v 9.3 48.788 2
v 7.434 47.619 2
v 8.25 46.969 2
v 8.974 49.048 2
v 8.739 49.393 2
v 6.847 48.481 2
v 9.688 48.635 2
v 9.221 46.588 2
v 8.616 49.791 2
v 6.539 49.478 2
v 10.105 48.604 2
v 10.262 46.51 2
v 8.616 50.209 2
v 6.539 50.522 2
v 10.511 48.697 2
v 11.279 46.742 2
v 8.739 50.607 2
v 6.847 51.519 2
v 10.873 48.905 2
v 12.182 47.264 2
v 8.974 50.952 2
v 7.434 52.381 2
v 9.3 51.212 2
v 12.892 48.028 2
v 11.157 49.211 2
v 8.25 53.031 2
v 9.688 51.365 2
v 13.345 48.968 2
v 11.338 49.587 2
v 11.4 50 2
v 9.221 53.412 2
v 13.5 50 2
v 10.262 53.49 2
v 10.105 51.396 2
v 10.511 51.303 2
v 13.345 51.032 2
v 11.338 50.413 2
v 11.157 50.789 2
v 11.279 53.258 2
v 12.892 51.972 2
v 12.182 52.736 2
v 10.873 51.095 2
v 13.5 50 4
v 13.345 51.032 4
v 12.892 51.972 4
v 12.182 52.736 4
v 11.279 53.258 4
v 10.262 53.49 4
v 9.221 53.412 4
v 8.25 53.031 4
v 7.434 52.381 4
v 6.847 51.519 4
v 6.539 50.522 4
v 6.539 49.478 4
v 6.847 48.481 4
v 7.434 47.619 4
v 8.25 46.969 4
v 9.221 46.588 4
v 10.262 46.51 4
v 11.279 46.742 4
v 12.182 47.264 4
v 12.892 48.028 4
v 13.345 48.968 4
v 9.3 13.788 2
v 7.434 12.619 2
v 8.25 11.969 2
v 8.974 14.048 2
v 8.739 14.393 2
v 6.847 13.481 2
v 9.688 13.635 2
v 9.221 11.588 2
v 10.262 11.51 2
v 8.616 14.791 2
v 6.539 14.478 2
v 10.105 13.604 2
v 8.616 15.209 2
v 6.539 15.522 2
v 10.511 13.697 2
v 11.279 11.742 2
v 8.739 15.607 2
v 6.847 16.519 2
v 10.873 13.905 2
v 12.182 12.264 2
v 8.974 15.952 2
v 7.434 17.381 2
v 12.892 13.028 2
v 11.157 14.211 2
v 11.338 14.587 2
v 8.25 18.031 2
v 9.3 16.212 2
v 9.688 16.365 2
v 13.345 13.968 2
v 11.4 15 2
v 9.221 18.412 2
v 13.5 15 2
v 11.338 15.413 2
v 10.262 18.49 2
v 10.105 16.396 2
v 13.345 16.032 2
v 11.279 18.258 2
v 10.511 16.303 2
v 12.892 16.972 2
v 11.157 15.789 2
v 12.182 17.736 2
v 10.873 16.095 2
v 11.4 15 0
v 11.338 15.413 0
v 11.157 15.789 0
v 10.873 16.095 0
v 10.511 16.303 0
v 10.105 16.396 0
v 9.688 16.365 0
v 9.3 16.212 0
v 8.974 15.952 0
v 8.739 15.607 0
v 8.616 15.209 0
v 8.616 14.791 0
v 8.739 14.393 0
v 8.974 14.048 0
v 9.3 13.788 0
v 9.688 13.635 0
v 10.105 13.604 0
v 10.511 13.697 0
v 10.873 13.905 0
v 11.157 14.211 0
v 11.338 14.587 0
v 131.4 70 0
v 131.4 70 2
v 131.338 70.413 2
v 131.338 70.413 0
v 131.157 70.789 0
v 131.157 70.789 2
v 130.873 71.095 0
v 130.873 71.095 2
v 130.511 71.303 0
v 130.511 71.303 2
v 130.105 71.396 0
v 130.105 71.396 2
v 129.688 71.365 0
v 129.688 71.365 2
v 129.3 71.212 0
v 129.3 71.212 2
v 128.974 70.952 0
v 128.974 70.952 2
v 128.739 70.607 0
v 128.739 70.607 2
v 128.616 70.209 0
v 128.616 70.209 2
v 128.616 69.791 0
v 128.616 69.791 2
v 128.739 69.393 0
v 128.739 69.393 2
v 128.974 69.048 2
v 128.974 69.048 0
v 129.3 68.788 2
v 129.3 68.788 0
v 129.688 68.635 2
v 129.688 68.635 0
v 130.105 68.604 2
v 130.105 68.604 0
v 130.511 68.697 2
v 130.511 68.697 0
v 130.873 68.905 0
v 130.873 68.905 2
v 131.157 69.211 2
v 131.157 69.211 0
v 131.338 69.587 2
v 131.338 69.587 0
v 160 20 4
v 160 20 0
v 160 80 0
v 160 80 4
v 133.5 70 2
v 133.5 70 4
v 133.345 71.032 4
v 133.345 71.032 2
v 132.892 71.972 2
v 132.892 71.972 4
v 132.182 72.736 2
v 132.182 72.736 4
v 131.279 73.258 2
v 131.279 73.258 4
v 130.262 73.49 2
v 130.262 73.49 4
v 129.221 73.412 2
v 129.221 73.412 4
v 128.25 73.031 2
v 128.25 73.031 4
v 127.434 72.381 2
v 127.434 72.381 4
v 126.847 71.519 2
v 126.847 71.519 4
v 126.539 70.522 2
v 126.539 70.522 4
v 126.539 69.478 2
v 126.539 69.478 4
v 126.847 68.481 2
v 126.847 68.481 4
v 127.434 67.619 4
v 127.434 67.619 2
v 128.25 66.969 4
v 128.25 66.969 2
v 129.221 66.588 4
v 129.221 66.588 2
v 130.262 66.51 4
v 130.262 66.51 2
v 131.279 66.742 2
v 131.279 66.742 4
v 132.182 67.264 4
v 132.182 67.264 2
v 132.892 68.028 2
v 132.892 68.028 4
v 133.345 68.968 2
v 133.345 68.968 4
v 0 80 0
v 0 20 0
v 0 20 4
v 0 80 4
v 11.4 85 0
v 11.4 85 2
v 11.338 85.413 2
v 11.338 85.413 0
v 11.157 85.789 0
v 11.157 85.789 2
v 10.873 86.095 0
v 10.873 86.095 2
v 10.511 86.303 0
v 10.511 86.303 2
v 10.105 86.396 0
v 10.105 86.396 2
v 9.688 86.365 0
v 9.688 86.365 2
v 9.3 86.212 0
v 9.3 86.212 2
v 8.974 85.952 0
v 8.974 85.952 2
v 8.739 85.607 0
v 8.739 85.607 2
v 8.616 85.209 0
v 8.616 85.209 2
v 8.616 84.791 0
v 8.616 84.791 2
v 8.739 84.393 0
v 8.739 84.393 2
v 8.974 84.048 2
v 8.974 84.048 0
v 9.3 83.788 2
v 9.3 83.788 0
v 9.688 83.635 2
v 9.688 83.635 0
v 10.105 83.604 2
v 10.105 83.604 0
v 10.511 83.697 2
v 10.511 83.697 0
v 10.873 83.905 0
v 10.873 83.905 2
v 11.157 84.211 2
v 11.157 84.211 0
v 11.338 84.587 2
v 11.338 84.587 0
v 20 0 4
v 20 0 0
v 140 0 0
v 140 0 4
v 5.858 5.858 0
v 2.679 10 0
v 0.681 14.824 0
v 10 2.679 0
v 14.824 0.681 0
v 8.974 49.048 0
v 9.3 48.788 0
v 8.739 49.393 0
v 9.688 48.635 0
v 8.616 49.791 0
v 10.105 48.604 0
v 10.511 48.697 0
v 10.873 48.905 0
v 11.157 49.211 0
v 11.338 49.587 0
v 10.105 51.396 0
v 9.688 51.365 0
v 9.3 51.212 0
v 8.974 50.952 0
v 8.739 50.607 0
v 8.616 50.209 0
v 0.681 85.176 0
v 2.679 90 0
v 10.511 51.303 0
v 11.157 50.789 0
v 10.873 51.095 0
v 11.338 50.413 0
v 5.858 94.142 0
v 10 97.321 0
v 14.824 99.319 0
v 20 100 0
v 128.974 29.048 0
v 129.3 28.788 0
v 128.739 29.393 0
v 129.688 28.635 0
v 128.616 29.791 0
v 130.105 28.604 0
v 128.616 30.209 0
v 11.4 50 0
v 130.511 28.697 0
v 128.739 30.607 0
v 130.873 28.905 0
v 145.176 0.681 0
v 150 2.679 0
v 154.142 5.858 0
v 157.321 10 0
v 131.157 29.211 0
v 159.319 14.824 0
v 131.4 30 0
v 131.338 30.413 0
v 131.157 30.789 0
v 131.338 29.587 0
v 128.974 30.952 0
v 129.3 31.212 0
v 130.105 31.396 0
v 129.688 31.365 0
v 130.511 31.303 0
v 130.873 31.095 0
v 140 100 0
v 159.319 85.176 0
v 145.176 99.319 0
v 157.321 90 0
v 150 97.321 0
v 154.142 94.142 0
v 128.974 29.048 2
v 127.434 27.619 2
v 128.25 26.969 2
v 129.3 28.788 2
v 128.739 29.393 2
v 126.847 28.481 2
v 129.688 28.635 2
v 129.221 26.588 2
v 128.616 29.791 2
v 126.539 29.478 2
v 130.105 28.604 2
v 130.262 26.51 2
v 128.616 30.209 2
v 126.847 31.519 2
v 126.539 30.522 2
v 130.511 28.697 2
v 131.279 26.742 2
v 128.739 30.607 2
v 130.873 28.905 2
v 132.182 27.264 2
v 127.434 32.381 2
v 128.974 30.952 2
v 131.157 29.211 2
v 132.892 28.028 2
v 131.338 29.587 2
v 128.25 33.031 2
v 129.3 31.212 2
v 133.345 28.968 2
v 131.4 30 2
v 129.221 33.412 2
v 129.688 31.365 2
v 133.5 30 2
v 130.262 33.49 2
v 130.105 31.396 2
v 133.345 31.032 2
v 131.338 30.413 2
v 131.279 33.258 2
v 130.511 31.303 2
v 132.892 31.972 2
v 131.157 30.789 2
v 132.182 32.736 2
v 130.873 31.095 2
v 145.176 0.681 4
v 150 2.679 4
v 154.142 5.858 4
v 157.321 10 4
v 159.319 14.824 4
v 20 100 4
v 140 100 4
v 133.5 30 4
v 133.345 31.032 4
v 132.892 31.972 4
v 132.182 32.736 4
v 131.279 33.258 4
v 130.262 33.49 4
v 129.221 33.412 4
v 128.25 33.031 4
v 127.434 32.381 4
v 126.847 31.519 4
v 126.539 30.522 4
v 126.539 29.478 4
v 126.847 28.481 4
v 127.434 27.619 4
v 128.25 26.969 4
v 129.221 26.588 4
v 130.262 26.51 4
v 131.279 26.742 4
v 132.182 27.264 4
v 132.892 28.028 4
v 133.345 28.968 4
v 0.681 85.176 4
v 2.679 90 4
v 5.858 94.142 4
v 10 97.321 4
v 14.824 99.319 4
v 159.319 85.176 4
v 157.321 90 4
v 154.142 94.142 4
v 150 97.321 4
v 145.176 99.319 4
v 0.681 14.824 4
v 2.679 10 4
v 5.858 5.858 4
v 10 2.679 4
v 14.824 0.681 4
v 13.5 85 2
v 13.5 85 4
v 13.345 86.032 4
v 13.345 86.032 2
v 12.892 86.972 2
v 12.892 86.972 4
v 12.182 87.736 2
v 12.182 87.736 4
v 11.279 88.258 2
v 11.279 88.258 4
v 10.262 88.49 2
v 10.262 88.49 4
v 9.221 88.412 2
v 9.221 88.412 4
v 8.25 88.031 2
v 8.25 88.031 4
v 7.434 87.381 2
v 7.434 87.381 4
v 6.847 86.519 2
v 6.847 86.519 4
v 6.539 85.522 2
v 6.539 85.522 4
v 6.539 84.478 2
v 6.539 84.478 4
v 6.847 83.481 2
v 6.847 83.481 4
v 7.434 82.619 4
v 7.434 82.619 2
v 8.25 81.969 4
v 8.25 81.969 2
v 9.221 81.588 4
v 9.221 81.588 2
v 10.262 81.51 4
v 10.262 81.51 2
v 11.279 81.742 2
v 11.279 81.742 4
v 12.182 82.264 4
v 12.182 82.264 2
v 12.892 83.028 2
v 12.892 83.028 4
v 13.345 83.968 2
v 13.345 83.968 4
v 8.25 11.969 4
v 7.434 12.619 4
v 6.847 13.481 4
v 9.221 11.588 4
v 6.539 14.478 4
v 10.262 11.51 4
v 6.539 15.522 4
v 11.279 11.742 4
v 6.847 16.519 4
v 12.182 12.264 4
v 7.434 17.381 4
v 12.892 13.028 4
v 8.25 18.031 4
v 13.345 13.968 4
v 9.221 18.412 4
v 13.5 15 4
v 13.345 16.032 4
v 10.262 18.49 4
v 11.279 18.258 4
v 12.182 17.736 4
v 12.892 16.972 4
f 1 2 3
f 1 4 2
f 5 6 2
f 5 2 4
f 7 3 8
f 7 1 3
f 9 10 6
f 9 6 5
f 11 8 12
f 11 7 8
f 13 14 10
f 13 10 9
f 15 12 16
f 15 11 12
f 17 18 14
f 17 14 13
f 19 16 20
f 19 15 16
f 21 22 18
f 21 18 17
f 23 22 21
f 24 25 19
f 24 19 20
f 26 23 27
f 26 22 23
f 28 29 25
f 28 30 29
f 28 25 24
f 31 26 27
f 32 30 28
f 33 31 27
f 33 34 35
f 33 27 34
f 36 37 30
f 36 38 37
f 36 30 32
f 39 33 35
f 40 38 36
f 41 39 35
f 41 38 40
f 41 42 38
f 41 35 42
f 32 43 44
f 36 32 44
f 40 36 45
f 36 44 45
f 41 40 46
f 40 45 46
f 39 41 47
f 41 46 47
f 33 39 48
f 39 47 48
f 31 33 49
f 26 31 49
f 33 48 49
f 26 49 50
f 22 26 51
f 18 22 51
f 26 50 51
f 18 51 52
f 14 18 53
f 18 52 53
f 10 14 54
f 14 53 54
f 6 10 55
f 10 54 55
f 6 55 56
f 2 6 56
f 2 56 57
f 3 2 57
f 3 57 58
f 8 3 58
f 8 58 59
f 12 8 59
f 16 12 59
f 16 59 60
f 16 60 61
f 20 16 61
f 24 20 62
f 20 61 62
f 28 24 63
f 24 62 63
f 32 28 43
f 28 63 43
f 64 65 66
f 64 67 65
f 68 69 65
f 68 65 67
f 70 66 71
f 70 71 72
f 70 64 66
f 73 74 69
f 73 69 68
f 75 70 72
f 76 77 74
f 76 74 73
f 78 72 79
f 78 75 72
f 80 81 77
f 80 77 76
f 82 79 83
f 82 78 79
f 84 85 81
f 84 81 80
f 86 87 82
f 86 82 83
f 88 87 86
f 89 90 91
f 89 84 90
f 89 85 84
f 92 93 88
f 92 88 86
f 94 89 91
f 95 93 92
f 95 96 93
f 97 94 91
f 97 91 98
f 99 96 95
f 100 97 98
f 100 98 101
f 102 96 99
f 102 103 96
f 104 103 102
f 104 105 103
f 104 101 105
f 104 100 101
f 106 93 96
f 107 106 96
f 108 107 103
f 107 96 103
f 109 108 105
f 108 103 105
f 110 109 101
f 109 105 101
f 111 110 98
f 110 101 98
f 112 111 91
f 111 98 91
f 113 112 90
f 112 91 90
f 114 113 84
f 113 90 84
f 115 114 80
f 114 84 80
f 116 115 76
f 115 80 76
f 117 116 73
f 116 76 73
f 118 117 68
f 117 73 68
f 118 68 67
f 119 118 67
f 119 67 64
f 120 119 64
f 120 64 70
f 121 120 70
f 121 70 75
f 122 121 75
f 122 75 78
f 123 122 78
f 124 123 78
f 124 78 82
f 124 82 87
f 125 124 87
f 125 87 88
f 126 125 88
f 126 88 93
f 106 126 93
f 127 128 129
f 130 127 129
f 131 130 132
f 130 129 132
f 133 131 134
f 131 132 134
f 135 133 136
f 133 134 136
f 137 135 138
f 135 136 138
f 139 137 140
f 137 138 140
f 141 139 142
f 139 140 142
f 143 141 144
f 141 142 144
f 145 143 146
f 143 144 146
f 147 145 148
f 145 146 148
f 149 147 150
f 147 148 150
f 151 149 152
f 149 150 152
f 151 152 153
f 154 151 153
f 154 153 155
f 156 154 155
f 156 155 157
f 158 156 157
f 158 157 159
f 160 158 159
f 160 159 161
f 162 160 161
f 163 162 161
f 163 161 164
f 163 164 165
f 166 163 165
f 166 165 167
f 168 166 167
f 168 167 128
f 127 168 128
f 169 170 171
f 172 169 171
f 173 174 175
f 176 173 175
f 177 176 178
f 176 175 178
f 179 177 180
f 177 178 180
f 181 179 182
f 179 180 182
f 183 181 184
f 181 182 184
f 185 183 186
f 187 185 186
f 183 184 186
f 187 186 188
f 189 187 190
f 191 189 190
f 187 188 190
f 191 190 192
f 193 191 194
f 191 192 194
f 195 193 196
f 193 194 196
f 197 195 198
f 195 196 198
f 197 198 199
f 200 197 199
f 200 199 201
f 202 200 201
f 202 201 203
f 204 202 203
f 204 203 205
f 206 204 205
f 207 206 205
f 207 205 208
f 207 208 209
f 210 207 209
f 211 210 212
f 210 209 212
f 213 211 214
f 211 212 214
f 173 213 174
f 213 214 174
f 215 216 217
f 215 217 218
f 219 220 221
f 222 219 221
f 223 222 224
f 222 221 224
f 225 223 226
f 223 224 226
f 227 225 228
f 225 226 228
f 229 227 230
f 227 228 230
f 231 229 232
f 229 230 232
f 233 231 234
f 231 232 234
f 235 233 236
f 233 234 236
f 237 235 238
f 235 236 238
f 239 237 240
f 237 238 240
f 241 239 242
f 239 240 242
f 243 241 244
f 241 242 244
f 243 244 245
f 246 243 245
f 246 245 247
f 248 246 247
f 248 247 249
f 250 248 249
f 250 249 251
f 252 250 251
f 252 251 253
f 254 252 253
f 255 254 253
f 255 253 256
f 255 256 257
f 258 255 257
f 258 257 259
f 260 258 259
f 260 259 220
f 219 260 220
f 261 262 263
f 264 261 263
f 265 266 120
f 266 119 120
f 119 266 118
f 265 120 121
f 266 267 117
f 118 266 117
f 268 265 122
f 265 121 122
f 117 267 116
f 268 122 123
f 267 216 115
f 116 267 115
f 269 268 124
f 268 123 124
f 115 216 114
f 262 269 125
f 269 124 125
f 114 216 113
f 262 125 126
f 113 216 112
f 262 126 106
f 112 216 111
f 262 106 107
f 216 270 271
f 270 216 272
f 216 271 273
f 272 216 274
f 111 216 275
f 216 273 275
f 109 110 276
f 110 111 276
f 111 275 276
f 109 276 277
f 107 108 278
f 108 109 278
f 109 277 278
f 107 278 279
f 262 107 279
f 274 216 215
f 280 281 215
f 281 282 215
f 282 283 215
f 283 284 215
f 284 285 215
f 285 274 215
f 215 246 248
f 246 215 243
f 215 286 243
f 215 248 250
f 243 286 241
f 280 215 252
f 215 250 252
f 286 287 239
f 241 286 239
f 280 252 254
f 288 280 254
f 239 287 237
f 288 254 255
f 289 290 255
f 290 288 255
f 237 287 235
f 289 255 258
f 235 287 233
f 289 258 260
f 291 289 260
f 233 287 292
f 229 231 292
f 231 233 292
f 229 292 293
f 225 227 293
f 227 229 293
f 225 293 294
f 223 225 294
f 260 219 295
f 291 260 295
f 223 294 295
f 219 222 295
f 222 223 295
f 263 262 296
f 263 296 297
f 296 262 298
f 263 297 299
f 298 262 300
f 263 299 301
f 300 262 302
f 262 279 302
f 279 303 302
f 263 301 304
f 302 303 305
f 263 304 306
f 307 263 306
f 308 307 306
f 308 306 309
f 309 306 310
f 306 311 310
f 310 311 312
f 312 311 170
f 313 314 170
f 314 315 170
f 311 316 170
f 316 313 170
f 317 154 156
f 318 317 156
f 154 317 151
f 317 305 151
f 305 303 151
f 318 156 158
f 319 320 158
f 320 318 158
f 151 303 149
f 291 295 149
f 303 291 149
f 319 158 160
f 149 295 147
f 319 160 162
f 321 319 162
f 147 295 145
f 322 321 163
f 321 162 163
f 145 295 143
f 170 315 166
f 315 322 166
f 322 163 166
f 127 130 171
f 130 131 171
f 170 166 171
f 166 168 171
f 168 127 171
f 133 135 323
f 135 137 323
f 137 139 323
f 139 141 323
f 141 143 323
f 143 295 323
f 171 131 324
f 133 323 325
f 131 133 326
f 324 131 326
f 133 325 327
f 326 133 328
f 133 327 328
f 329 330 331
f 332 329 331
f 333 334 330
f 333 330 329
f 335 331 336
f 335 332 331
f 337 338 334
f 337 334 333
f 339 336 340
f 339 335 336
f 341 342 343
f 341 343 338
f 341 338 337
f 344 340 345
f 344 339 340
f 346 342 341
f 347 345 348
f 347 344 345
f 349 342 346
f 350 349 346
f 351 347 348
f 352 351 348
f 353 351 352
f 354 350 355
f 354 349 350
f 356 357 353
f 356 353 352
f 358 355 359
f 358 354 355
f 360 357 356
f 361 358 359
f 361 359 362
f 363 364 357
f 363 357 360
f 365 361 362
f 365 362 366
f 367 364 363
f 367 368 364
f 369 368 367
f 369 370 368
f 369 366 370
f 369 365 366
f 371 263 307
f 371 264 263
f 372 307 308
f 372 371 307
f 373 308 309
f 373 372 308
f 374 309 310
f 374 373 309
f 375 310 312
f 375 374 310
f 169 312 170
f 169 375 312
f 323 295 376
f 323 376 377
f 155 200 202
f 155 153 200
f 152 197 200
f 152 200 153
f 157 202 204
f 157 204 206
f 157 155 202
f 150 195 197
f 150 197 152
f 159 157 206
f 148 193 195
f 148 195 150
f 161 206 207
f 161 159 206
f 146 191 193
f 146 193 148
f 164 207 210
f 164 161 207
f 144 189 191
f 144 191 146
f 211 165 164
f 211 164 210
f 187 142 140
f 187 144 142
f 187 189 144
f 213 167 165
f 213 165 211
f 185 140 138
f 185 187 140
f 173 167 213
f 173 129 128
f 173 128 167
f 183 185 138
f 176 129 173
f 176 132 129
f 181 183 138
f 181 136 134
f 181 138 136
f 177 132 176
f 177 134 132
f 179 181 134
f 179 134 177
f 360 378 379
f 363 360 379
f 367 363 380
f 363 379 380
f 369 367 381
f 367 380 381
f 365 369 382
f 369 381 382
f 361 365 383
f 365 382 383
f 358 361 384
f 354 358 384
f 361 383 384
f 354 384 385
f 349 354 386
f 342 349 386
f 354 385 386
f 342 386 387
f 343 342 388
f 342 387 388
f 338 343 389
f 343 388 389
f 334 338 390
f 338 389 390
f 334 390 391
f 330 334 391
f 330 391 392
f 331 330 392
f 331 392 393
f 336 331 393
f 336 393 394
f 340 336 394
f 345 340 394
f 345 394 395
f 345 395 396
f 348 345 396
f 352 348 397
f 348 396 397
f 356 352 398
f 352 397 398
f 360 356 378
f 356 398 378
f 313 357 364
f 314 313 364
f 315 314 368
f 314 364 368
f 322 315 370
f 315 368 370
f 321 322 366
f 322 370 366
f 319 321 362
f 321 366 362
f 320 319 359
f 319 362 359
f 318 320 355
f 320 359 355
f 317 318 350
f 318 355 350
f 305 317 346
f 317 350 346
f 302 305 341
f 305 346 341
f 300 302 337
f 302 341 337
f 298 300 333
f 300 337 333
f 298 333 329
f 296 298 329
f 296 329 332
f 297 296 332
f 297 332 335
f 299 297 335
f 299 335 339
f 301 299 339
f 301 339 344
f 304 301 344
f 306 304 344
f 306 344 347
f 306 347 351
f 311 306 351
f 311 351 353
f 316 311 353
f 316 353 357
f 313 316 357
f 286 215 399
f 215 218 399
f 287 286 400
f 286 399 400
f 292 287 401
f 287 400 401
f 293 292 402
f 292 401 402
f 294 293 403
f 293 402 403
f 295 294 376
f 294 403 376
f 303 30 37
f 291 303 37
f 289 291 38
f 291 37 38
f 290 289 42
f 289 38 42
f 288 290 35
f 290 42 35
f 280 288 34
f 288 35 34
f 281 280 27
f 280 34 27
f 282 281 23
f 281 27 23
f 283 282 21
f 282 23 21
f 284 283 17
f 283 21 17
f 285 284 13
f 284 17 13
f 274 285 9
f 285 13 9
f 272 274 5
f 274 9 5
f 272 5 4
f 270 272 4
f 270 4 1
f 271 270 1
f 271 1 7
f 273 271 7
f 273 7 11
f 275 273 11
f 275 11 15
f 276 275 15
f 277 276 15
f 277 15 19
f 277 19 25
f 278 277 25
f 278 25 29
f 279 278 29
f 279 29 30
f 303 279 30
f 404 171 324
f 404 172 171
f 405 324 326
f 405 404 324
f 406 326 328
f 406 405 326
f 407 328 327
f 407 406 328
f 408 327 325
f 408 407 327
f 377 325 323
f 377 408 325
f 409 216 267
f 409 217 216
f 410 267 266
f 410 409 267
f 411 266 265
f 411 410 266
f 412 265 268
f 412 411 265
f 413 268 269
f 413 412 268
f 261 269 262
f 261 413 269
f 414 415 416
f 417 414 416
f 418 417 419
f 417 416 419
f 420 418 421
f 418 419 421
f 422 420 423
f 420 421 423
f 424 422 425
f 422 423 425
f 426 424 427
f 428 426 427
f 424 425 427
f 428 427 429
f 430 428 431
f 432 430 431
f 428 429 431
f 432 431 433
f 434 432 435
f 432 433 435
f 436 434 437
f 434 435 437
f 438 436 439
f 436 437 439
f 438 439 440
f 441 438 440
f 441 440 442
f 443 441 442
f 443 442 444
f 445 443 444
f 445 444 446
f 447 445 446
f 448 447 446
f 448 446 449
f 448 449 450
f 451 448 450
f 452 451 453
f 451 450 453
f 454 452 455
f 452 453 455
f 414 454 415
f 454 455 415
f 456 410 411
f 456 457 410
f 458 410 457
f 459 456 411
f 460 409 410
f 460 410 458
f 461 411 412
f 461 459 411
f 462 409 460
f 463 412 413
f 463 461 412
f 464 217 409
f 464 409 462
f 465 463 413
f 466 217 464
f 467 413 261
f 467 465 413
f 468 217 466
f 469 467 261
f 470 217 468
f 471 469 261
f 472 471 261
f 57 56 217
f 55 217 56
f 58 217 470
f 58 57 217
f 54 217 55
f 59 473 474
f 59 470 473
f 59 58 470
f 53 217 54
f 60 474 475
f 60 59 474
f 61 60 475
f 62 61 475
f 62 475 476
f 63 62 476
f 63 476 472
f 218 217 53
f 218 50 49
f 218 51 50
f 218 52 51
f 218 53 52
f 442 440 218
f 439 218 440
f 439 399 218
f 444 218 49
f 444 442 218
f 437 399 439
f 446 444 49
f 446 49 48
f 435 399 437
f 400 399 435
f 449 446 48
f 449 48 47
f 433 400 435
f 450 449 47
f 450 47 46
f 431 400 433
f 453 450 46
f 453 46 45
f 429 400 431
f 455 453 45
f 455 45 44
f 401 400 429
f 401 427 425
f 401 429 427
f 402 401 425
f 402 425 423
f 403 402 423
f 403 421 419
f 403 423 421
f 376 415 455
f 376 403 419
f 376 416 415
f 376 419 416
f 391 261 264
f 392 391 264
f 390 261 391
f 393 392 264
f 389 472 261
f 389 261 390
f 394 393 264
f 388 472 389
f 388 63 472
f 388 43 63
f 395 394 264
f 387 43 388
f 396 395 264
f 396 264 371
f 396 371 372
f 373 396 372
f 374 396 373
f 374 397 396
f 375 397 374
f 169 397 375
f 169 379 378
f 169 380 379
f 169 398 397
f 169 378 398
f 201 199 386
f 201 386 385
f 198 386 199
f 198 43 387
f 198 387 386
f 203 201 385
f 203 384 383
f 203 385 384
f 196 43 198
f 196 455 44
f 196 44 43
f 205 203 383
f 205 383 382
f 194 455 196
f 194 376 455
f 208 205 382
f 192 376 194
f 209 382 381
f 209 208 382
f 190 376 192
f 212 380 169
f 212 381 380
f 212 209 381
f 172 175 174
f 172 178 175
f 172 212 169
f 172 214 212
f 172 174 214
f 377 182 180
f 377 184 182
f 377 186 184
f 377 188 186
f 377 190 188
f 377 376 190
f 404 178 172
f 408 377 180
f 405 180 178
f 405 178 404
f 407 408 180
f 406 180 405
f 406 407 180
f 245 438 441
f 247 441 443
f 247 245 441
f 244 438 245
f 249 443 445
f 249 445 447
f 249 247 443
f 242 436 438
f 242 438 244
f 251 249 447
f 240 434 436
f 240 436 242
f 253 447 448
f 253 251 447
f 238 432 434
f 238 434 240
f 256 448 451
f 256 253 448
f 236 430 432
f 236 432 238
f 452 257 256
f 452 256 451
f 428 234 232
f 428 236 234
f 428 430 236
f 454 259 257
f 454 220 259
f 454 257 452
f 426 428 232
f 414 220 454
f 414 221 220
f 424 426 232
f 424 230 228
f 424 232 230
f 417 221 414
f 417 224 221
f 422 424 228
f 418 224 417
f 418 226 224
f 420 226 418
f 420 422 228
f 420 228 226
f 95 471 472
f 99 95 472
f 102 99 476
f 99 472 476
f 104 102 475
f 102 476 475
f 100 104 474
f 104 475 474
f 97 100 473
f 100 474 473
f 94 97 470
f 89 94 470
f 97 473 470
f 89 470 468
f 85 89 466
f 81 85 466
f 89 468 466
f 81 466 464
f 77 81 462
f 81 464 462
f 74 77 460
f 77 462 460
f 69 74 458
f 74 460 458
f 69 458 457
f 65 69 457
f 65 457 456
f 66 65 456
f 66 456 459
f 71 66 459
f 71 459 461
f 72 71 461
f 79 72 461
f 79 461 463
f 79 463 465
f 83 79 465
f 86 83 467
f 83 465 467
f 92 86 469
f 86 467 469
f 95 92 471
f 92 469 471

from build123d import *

# Parameters (mm, degrees)
SKETCH1_W           = 160
SKETCH1_H           = 100
BOSS_EXTRUDE1_DEPTH = 4
FILLET1_R           = 20
SKETCH2_R           = 1.4
CUT_EXTRUDE1_DEPTH  = 4
SKETCH3_R           = 3.5
CUT_EXTRUDE2_DEPTH  = 2


with BuildPart() as part:
    # Sketch1 → Boss-Extrude1 (new body)
    with BuildSketch(Plane.XY):
        with Locations((80, 50)):
            Rectangle(SKETCH1_W, SKETCH1_H)
    extrude(amount=BOSS_EXTRUDE1_DEPTH)

    # Fillet1
    fillet1_edges = [part.edges().sort_by_distance(p)[0] for p in [
        (0, 100, 2),
        (160, 100, 2),
        (160, 0, 2),
        (0, 0, 2),
    ]]
    fillet(fillet1_edges, radius=FILLET1_R)

    # Sketch2 → Cut-Extrude1 (cut)
    with BuildSketch(Plane.XY.offset(4)):
        with Locations((130, 30)):
            Circle(SKETCH2_R)
        with Locations((130, 70)):
            Circle(SKETCH2_R)
        with Locations((10, 15)):
            Circle(SKETCH2_R)
        with Locations((10, 50)):
            Circle(SKETCH2_R)
        with Locations((10, 85)):
            Circle(SKETCH2_R)
    extrude(amount=-CUT_EXTRUDE1_DEPTH, mode=Mode.SUBTRACT)

    # Sketch3 → Cut-Extrude2 (cut)
    with BuildSketch(Plane.XY.offset(4)):
        with Locations((130, 30)):
            Circle(SKETCH3_R)
        with Locations((130, 70)):
            Circle(SKETCH3_R)
        with Locations((10, 85)):
            Circle(SKETCH3_R)
        with Locations((10, 50)):
            Circle(SKETCH3_R)
        with Locations((10, 15)):
            Circle(SKETCH3_R)
    extrude(amount=-CUT_EXTRUDE2_DEPTH, mode=Mode.SUBTRACT)


solid = part.part
